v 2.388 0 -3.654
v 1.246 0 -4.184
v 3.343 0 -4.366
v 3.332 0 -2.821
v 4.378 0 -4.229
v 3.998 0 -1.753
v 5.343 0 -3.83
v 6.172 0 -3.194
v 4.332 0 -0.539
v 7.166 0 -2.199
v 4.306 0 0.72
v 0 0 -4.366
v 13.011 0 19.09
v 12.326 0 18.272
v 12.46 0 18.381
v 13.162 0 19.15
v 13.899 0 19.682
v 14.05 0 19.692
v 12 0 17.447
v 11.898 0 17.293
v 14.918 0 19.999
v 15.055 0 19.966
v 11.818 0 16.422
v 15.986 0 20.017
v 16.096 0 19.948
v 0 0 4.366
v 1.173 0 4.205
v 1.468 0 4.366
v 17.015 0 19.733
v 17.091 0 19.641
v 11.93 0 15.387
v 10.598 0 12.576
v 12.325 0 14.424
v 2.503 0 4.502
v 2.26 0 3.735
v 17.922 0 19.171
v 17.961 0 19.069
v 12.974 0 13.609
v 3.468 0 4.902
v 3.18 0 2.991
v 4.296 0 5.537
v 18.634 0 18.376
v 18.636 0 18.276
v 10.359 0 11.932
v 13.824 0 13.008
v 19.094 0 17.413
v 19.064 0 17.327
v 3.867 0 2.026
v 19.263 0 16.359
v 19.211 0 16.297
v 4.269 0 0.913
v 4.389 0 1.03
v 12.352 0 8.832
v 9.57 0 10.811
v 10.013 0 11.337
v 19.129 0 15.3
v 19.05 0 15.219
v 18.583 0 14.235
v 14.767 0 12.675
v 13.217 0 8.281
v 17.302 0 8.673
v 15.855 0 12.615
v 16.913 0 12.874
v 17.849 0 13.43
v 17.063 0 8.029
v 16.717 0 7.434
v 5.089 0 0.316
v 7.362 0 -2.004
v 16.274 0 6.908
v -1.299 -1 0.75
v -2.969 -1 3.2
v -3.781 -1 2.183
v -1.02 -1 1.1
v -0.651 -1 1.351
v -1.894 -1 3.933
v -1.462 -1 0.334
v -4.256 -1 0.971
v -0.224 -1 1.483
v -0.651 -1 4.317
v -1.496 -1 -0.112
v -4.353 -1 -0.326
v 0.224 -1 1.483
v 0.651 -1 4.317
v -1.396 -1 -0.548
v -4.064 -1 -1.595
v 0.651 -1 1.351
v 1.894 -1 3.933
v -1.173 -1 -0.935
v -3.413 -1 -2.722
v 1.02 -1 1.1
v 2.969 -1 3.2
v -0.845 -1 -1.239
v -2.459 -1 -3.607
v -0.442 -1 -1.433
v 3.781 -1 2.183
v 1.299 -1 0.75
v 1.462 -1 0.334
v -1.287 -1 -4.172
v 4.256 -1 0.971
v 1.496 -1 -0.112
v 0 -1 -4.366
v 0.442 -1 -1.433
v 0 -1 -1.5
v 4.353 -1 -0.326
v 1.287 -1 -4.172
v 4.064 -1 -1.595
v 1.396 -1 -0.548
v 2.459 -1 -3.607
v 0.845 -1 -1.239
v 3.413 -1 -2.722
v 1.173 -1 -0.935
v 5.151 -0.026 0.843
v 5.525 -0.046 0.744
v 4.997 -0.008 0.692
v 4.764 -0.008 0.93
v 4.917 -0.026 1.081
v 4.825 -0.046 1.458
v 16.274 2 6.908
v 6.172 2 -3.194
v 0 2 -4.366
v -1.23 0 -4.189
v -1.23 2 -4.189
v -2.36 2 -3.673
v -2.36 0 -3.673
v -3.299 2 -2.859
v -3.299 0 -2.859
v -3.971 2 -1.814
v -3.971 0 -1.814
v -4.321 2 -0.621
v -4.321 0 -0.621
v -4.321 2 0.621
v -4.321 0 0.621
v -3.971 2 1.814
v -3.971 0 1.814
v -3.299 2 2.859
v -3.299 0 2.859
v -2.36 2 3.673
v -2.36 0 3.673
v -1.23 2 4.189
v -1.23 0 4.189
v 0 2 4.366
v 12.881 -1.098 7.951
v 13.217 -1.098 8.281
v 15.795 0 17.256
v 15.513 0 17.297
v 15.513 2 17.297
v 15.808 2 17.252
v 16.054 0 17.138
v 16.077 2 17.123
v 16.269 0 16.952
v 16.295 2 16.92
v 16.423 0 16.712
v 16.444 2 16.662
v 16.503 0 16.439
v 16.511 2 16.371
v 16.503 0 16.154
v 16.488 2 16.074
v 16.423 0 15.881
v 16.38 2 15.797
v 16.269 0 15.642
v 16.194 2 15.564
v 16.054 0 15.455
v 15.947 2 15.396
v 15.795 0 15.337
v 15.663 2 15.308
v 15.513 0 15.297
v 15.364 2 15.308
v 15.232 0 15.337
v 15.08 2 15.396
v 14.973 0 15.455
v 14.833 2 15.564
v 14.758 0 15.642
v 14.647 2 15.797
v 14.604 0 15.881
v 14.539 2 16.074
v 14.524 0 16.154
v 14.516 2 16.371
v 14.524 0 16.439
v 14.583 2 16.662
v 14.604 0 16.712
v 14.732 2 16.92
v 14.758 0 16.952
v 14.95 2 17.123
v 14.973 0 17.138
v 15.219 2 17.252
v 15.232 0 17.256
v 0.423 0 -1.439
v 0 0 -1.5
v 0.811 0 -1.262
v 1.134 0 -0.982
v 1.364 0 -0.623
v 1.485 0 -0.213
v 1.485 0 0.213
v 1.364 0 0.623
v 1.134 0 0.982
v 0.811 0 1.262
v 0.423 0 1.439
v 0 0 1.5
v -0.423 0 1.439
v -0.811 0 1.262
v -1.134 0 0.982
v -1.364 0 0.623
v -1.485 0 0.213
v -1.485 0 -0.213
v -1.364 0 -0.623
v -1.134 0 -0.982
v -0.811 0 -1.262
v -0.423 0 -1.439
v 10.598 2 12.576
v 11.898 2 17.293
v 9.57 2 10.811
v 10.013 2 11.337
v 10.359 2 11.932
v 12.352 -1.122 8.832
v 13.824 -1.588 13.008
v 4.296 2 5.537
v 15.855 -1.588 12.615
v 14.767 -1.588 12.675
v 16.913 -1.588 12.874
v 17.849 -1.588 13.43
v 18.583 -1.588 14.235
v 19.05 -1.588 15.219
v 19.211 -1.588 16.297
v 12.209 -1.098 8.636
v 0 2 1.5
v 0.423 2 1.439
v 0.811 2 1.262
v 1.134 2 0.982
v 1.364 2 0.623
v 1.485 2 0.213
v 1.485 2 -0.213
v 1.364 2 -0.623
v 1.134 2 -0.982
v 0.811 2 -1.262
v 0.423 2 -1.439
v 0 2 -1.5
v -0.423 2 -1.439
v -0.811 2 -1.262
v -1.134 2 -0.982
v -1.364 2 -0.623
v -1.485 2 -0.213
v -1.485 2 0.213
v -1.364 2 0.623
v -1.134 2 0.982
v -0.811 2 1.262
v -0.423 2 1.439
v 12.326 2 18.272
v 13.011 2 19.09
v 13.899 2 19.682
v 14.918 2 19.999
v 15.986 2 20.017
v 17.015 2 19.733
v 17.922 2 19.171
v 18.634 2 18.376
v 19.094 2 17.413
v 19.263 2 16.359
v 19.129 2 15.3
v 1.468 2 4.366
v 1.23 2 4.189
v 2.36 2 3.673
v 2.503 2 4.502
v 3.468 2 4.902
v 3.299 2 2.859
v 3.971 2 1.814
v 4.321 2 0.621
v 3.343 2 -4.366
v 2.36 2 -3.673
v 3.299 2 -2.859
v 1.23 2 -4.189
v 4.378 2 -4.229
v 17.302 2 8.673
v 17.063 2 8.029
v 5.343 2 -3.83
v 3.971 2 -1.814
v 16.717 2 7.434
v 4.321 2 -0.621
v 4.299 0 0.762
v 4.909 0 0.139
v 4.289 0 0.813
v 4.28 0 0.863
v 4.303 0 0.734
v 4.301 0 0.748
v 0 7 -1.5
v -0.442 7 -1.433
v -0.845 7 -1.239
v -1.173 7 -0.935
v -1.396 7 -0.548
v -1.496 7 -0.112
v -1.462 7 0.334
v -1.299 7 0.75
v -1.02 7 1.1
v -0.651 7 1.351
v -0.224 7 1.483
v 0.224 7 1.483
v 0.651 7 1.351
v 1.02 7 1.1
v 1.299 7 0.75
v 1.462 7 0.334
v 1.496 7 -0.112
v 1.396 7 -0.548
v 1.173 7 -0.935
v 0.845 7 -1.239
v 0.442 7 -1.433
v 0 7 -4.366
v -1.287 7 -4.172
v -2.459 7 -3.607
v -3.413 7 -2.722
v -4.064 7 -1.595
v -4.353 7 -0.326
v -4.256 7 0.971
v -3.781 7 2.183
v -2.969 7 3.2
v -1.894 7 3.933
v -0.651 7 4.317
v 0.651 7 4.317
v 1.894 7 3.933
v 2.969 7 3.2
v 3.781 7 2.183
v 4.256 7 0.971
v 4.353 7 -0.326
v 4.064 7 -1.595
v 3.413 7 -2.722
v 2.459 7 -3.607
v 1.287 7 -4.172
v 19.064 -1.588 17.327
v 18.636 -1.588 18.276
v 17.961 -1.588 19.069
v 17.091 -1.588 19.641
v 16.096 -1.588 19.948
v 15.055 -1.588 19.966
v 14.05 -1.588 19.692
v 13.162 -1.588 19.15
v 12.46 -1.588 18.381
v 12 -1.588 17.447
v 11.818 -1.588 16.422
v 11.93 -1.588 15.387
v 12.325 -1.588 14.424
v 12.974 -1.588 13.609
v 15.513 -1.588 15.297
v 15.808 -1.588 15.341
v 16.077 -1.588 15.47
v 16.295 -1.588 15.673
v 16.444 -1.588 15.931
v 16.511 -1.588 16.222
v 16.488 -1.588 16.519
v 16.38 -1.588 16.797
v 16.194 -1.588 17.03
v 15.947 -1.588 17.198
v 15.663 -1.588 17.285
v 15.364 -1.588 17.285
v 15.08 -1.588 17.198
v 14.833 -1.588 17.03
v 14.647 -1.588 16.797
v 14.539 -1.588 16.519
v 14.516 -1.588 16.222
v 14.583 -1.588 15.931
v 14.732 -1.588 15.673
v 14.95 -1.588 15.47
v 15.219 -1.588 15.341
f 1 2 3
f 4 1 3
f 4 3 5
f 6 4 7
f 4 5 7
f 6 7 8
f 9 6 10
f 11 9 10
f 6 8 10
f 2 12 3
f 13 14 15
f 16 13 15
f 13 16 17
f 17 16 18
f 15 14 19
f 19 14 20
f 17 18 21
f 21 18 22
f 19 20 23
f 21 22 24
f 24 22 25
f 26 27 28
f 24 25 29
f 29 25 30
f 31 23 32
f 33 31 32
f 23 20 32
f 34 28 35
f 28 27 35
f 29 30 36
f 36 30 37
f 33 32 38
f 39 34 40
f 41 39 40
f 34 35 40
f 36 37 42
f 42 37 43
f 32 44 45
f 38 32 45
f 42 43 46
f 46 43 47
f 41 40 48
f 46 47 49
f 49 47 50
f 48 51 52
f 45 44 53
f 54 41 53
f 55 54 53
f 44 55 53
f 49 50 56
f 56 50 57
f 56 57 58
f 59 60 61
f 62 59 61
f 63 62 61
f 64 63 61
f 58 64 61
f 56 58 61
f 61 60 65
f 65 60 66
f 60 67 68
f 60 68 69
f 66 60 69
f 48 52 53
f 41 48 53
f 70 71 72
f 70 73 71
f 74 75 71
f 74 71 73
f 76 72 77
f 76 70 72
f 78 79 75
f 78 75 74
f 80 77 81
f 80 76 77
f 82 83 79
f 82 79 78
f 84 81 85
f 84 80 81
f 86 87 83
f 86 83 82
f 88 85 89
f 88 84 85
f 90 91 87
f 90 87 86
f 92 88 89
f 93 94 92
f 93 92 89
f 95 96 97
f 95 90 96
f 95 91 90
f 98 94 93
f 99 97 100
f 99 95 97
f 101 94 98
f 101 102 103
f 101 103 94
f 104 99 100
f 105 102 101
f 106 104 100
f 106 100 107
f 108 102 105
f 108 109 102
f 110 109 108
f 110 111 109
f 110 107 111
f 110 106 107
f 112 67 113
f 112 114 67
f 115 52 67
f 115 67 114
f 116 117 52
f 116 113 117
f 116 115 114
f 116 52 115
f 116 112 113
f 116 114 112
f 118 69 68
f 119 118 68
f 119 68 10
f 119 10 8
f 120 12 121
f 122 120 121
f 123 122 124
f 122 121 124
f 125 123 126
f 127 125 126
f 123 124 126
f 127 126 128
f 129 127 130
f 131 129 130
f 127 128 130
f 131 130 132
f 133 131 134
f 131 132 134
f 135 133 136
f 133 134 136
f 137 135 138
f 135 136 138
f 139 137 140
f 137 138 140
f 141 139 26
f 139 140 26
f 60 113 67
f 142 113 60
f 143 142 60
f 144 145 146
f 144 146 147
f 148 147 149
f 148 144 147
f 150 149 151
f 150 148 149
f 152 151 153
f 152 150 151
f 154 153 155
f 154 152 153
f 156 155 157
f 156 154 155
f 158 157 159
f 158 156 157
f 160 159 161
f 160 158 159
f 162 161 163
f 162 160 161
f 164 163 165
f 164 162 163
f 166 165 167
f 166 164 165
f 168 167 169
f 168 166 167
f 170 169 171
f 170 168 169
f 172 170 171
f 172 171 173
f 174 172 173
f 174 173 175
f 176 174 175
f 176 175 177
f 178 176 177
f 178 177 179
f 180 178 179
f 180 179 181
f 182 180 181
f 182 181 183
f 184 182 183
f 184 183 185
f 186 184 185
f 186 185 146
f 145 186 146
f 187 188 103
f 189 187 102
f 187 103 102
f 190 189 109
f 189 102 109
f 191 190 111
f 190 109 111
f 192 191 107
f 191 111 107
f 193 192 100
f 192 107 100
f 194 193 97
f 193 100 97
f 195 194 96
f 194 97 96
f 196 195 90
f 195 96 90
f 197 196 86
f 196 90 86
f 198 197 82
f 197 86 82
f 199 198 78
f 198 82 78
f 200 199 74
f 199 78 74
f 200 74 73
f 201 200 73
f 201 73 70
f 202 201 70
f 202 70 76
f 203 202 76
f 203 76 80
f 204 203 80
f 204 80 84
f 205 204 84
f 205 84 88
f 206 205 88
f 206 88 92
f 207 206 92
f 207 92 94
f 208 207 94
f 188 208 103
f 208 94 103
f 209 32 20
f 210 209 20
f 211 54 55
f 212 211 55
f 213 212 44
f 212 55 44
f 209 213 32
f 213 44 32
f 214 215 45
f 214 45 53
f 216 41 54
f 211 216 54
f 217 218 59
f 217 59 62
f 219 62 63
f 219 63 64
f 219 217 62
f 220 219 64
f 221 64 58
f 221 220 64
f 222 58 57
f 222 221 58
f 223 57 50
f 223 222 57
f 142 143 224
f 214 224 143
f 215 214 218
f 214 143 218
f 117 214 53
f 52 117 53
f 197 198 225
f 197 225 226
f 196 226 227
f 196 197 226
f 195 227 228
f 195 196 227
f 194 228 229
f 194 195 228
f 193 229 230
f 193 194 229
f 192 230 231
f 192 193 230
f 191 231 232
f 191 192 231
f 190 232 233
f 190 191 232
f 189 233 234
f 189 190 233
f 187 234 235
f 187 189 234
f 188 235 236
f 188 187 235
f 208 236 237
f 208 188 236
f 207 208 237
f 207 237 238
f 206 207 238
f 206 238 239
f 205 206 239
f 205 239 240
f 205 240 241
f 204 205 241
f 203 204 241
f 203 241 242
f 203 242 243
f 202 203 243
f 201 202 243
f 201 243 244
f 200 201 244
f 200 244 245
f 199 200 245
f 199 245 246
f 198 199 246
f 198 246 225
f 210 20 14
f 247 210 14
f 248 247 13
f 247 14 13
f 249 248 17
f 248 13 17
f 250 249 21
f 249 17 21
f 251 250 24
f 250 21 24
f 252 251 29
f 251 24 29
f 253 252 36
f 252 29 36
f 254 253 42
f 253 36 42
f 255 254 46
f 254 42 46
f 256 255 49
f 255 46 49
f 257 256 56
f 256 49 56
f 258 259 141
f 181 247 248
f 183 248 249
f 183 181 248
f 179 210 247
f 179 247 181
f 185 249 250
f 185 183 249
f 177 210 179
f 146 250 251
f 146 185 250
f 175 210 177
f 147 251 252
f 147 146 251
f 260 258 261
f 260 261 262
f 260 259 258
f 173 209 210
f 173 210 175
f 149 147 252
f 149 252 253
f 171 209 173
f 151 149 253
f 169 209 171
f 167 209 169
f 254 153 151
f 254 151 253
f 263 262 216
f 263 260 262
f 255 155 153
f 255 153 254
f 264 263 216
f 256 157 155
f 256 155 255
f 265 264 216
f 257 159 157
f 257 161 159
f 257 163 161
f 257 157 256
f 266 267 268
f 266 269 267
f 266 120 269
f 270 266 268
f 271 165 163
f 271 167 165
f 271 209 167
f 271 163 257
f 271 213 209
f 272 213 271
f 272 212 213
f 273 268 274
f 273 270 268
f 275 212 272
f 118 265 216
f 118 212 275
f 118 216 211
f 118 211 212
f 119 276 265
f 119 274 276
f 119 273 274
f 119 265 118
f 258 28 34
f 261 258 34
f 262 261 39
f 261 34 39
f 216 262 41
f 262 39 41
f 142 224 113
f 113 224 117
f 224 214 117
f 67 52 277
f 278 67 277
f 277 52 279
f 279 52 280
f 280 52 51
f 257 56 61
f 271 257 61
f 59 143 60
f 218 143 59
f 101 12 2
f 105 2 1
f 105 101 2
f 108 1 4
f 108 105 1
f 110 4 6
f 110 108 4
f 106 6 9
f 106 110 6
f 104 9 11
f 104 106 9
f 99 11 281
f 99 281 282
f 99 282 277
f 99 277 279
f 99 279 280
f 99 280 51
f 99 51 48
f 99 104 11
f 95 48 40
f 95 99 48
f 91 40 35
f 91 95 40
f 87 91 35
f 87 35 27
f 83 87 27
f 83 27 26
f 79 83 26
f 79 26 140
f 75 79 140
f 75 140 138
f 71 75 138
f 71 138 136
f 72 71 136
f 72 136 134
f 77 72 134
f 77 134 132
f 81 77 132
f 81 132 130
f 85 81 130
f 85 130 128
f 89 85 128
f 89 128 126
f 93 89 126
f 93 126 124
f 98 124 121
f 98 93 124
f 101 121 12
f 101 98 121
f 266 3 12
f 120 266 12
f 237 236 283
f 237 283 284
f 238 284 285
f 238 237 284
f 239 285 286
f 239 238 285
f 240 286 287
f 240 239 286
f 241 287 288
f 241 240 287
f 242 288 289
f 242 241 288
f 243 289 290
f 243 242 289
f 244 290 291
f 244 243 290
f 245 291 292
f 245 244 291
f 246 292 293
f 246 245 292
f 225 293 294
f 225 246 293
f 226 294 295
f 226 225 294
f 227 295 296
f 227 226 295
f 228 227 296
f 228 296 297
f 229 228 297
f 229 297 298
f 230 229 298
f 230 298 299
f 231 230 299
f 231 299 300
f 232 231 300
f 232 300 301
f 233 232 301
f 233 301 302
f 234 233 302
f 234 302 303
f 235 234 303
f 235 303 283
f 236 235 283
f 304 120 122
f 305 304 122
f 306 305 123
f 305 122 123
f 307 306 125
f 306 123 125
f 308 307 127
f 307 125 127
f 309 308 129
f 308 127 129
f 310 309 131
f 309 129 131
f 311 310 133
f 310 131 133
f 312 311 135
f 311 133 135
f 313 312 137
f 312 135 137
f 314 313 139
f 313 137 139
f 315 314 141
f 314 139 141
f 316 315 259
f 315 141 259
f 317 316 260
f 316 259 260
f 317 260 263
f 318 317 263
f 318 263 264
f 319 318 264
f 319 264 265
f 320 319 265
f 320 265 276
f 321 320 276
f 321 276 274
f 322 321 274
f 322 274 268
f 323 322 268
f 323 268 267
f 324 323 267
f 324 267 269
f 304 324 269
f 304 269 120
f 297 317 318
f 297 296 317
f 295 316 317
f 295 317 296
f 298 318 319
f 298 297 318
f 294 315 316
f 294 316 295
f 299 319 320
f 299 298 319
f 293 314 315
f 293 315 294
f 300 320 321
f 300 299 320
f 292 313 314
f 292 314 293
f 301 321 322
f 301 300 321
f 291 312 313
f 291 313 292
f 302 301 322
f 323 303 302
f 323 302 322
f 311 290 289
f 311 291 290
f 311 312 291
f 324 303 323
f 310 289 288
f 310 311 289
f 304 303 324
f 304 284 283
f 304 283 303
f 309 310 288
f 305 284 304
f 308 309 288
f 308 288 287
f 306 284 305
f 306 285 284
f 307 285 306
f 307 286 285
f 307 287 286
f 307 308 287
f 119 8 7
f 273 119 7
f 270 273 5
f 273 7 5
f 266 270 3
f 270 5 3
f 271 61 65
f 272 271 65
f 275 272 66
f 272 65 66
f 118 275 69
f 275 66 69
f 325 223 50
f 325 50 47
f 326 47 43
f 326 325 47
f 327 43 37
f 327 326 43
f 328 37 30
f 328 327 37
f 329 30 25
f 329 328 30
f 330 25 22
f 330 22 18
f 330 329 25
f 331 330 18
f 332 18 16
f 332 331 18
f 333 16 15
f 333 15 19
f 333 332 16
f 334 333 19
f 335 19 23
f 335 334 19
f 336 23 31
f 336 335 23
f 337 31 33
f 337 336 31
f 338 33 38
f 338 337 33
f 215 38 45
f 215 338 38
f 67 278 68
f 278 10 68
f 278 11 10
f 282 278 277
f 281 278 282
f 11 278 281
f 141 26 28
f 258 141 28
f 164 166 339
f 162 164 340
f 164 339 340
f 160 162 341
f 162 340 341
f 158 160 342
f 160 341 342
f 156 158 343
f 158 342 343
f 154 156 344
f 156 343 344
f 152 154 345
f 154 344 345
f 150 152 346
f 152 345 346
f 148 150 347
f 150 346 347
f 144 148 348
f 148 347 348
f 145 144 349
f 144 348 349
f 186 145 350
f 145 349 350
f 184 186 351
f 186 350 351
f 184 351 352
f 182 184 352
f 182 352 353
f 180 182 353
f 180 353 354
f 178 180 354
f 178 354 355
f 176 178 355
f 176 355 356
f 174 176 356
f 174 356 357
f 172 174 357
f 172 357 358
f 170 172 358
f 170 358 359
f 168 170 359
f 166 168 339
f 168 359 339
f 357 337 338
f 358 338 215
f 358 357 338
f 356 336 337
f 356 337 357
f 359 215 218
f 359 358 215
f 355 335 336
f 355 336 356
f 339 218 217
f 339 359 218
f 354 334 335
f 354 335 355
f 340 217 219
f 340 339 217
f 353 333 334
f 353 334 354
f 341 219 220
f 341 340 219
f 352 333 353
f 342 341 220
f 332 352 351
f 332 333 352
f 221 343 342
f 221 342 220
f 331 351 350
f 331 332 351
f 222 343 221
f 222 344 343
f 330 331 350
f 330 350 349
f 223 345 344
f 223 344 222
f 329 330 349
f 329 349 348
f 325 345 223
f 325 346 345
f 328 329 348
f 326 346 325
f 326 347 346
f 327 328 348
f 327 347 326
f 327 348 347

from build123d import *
from build123d.topology import SkipClean

# Parameters (mm, degrees)
SKETCH1_R           = 4.365625
SKETCH1_R_2         = 1.5
SKETCH1_R_3         = 3.75
SKETCH1_R_4         = 1
BOSS_EXTRUDE1_DEPTH = 2
BOSS_EXTRUDE2_START = 1.5875
SKETCH2_R           = 3.697441577
SKETCH2_R_2         = 1
BOSS_EXTRUDE2_DEPTH = 1.5875
SKETCH3_W           = 10.440578203
SKETCH3_H           = 0.489894741
CUT_EXTRUDE1_DEPTH  = 27.994455117
CUT_EXTRUDE3_DEPTH  = 29.041350462
BOSS_EXTRUDE3_START = 1
SKETCH6_R           = 4.365625
SKETCH6_R_2         = 1.5
BOSS_EXTRUDE3_DEPTH = 1
SKETCH7_R           = 4.365625
SKETCH7_R_2         = 1.5
BOSS_EXTRUDE4_DEPTH = 5


with BuildPart() as part:
    # Sketch1 → Boss-Extrude1 (new body)
    # profile 1 of 3: a face of its own
    with BuildSketch(Plane(origin=(0, 0, 0), x_dir=(1, 0, 0), z_dir=(0, 1, 0))):
        with BuildLine():
            Line((3.343145751, 4.365625), (0, 4.365625))
            ThreePointArc((0, 4.365625), (3.086963042, 3.086963042), (4.365625, 0))
            ThreePointArc((4.365625, 0), (3.086963042, -3.086963042), (0, -4.365625))
            Line((0, -4.365625), (1.467794033, -4.365625))
            ThreePointArc((1.467794033, -4.365625), (2.998527762, -4.67010687), (4.296221157, -5.537197875))
            Line((4.296221157, -5.537197875), (9.570119263, -10.81109598))
            ThreePointArc((9.570119263, -10.81109598), (10.198536879, -11.627006165), (10.597804983, -12.576323346))
            Line((10.597804983, -12.576323346), (11.898392678, -17.293417078))
            ThreePointArc((11.898392678, -17.293417078), (14.516748696, -12.681561512), (19.128604262, -15.29991753))
            Line((19.128604262, -15.29991753), (17.301580945, -8.673497591))
            ThreePointArc((17.301580945, -8.673497591), (16.902312841, -7.724180409), (16.273895225, -6.908270225))
            Line((16.273895225, -6.908270225), (6.171572875, 3.194052125))
            ThreePointArc((6.171572875, 3.194052125), (4.87387948, 4.06114313), (3.343145751, 4.365625))
        make_face()
    # profile 2 of 3: a face of its own
    with BuildSketch(Plane(origin=(0, 0, 0), x_dir=(1, 0, 0), z_dir=(0, 1, 0))):
        Circle(SKETCH1_R)
        with Locations(Location((0, 0, 0), (0, 0, 270))):
            Circle(SKETCH1_R_2, mode=Mode.SUBTRACT)
    # profile 3 of 3: a face of its own
    with BuildSketch(Plane(origin=(0, 0, 0), x_dir=(1, 0, 0), z_dir=(0, 1, 0))):
        with Locations((15.51349847, -16.296667304)):
            Circle(SKETCH1_R_3)
        with Locations(Location((15.51349847, -16.296667304, 0), (0, 0, 270))):
            Circle(SKETCH1_R_4, mode=Mode.SUBTRACT)
    extrude(amount=BOSS_EXTRUDE1_DEPTH)

    # Sketch2 → Boss-Extrude2 (add)
    # profile 1 of 2: a face of its own
    with SkipClean():  # the faces are left unmerged after this step: merging them gives an invalid solid
        with BuildSketch(Plane.XZ.offset(BOSS_EXTRUDE2_START)):
            with BuildLine():
                ThreePointArc((14.766930457, 12.675381563), (14.284086567, 12.809602551), (13.823828401, 13.007884965))
                Line((13.823828401, 13.007884965), (12.351641282, 8.832220322))
                Line((12.351641282, 8.832220322), (4.20896111, 0.85370709))
                Line((4.20896111, 0.85370709), (4.908830924, 0.139436662))
                Line((4.908830924, 0.139436662), (13.217481616, 8.280574235))
                Line((13.217481616, 8.280574235), (14.766930457, 12.675381563))
            make_face()
        # profile 2 of 2: a face of its own
        with BuildSketch(Plane.XZ.offset(BOSS_EXTRUDE2_START)):
            with Locations((15.51349847, 16.296667304)):
                Circle(SKETCH2_R)
            with Locations(Location((15.51349847, 16.296667304, 0), (0, 0, 270))):
                Circle(SKETCH2_R_2, mode=Mode.SUBTRACT)
        extrude(amount=-BOSS_EXTRUDE2_DEPTH)

    # Sketch3 → Cut-Extrude1 (cut, through all)
    with SkipClean():  # the faces are left unmerged after this step: merging them gives an invalid solid
        with BuildSketch(Plane(origin=(9.159515606, 0, -3.229311271), x_dir=(-0.33250340190554584, 0, -0.9431020558355491), z_dir=(0.9431020558355491, 0, -0.33250340190554584))):
            with Locations((-6.983995086, -1.34255263)):
                Rectangle(SKETCH3_W, SKETCH3_H)
            Polygon((-12.204284187, -1.097605259), (-16.864233023, -1.5875), (-12.204284187, -1.5875), align=None)
        extrude(amount=-CUT_EXTRUDE1_DEPTH, mode=Mode.SUBTRACT)

    # Sketch5 → Cut-Extrude3 (cut, through all)
    with SkipClean():  # the faces are left unmerged after this step: merging them gives an invalid solid
        with BuildSketch(Plane(origin=(1.634858863, 0, -1.668497934), x_dir=(0.7142704274254688, 0, 0.6998698139693111), z_dir=(-0.6998698139693111, 0, 0.7142704274254688))):
            with BuildLine():
                Line((15.003816491, -1.122033372), (4.466951764, -0.046116385))
                add(Edge.make_bspline(
                    [(3.855909999, 0), (4.032985789, 0), (4.289562434, -0.028003199), (4.466951764, -0.046116385)],
                    knots=[0, 0, 0, 0, 1, 1, 1, 1], degree=3))
                Line((3.855909999, 0), (3.579570092, 0))
                Line((3.579570092, 0), (3.579570092, -1.146381057))
                Line((3.579570092, -1.146381057), (15.003816491, -1.122033372))
            make_face()
        extrude(amount=-CUT_EXTRUDE3_DEPTH, mode=Mode.SUBTRACT)

    # Sketch6 → Boss-Extrude3 (add)
    with SkipClean():  # the faces are left unmerged after this step: merging them gives an invalid solid
        with BuildSketch(Plane.XZ.offset(BOSS_EXTRUDE3_START)):
            with Locations(Location((0, 0, 0), (0, 0, 270))):
                Circle(SKETCH6_R)
            with Locations(Location((0, 0, 0), (0, 0, 270))):
                Circle(SKETCH6_R_2, mode=Mode.SUBTRACT)
        extrude(amount=-BOSS_EXTRUDE3_DEPTH)

    # Sketch7 → Boss-Extrude4 (add)
    with BuildSketch(Plane(origin=(0, 2, 0), x_dir=(1, 0, 0), z_dir=(0, 1, 0))):
        with Locations(Location((0, 0, 0), (0, 0, 90))):
            Circle(SKETCH7_R)
        with Locations(Location((0, 0, 0), (0, 0, 90))):
            Circle(SKETCH7_R_2, mode=Mode.SUBTRACT)
    extrude(amount=BOSS_EXTRUDE4_DEPTH)


solid = part.part
